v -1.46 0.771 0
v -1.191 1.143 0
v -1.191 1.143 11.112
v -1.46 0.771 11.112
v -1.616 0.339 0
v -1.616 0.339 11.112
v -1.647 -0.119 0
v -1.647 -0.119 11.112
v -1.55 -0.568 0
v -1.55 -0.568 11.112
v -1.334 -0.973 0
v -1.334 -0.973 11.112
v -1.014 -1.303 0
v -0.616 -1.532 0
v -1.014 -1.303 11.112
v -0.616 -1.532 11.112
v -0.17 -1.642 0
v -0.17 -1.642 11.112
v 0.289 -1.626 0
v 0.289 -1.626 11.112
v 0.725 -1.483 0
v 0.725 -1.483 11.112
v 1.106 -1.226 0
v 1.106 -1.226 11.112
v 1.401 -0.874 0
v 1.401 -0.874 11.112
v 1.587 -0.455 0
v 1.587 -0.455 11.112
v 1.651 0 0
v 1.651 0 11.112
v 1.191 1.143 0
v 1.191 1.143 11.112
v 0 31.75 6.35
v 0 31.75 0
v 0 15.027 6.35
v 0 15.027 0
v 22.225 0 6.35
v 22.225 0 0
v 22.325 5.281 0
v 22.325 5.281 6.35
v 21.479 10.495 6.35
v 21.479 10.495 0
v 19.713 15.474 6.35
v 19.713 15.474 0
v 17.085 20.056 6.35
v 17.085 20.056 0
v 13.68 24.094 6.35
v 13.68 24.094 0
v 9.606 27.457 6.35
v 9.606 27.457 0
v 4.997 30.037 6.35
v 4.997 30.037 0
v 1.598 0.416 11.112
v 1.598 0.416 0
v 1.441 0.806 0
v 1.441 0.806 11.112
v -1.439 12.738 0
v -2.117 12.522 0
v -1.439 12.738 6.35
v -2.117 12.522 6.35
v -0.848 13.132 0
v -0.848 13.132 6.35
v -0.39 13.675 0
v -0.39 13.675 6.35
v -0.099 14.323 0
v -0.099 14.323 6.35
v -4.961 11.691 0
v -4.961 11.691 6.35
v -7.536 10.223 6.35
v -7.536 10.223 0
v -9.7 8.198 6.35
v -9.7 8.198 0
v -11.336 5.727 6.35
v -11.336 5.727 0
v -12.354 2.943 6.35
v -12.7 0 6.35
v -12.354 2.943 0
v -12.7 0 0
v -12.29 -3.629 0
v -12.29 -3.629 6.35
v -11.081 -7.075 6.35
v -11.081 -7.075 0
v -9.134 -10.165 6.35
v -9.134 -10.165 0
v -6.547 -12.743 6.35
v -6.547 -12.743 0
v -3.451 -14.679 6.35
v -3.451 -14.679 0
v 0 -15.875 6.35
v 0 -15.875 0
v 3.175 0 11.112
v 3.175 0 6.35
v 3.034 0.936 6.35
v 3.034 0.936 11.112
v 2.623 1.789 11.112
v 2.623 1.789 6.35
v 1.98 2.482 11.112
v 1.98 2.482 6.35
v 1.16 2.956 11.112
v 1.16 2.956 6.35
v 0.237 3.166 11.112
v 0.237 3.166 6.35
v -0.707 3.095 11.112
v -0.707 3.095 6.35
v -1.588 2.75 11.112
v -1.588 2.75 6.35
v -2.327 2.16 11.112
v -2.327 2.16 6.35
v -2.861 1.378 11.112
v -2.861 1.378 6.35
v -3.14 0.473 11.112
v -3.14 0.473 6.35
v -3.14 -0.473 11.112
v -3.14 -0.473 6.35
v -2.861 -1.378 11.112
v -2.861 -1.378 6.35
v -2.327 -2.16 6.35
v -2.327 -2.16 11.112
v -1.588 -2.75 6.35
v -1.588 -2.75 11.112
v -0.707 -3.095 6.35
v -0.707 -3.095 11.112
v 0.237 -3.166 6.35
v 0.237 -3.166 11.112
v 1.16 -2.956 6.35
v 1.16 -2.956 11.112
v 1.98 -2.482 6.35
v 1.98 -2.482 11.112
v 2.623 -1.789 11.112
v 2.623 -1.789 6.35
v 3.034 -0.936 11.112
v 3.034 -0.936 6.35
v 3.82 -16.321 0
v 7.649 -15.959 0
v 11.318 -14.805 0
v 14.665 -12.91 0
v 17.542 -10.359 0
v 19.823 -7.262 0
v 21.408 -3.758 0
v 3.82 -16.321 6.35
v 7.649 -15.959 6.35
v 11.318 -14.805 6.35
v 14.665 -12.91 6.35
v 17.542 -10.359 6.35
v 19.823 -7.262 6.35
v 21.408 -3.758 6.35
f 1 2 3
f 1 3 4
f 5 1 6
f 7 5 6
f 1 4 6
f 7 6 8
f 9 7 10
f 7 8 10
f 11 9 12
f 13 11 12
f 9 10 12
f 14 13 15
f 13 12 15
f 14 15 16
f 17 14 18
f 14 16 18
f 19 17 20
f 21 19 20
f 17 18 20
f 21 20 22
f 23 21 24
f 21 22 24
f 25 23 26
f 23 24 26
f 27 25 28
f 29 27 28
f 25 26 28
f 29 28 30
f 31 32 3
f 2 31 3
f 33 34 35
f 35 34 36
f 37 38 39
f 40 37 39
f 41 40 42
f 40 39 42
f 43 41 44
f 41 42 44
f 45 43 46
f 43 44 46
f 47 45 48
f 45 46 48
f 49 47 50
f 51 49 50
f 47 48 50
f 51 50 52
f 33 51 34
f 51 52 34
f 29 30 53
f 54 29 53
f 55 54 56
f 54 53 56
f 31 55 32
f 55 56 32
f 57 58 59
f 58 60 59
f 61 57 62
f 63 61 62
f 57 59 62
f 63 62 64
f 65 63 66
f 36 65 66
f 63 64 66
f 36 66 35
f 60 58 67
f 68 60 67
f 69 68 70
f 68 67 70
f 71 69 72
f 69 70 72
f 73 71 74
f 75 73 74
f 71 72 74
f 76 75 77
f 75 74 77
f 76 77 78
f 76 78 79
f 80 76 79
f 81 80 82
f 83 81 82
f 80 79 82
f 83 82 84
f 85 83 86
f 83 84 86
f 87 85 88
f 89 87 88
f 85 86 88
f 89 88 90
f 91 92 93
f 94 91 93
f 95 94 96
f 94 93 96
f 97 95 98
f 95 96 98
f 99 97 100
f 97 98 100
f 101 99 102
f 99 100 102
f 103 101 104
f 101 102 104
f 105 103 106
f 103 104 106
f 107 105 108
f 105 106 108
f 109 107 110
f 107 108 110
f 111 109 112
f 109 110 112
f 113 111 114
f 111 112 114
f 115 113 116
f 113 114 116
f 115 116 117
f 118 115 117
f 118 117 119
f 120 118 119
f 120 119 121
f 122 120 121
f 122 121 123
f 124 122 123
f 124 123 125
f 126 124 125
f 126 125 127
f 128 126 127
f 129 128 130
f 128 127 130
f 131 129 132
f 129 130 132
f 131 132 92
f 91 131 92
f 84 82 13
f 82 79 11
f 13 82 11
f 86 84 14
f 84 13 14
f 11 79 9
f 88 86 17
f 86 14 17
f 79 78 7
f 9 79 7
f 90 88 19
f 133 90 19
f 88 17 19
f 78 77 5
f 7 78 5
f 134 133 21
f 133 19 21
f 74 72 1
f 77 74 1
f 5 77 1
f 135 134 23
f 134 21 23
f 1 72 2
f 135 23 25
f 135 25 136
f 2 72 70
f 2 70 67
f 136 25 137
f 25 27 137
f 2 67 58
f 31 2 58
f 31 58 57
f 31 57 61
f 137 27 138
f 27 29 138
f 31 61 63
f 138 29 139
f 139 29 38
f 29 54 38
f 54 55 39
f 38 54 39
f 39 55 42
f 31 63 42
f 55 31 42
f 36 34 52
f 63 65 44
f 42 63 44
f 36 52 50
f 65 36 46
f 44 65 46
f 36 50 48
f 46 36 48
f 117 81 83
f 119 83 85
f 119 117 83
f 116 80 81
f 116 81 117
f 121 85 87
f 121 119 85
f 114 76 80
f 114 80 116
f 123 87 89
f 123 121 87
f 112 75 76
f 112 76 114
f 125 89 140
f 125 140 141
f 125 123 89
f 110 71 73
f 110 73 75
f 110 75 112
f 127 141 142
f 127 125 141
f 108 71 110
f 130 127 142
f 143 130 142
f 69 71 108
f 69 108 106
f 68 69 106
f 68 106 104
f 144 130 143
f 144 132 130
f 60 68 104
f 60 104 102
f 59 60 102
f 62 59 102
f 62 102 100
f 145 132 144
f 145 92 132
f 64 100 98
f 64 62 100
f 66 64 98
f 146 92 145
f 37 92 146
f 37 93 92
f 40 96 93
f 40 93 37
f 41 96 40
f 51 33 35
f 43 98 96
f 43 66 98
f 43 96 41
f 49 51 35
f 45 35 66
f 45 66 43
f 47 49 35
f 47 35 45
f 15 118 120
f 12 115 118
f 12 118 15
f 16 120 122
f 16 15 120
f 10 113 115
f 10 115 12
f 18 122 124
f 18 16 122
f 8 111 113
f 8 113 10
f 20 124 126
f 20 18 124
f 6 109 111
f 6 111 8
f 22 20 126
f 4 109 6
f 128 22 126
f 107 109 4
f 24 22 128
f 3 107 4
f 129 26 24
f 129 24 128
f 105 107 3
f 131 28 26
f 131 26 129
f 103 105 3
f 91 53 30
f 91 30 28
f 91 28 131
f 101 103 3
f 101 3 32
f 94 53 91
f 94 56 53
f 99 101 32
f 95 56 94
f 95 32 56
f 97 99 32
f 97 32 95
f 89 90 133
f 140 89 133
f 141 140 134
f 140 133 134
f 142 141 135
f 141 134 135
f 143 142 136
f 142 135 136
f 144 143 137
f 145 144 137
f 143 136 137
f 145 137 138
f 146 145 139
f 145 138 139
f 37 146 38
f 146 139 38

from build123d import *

# Parameters (mm, degrees)
BOSS_EXTRUDE1_DEPTH = 6.35
SKETCH2_R           = 3.175
BOSS_EXTRUDE2_DEPTH = 4.7625
CUT_EXTRUDE1_DEPTH  = 12.1125
FILLET1_R           = 2.54


with BuildPart() as part:
    # Sketch1 → Boss-Extrude1 (new body)
    with BuildSketch(Plane.XY):
        with BuildLine():
            ThreePointArc((0, -15.875), (14.664616841, -12.910463577), (22.225, 0))
            ThreePointArc((22.225, 0), (17.085257234, 20.055930064), (0, 31.75))
            Line((0, 31.75), (0, 0))
            Line((0, 0), (-12.7, 0))
            ThreePointArc((-12.7, 0), (-9.134324659, -10.164959727), (0, -15.875))
        make_face()
        with BuildLine():
            Line((-12.7, 0), (0, 0))
            Line((0, 0), (0, 12.7))
            ThreePointArc((0, 12.7), (-8.980256121, 8.980256121), (-12.7, 0))
        make_face()
    extrude(amount=BOSS_EXTRUDE1_DEPTH)

    # Sketch2 → Boss-Extrude2 (add)
    with BuildSketch(Plane.XY.offset(6.35)):
        Circle(SKETCH2_R)
    extrude(amount=BOSS_EXTRUDE2_DEPTH)

    # Sketch3 → Cut-Extrude1 (cut, through all)
    with BuildSketch(Plane.XY.offset(11.1125)):
        with BuildLine():
            Line((1.191365603, 1.143), (-1.191365603, 1.143))
            ThreePointArc((-1.191365603, 1.143), (-0.61597743, -1.531787454), (1.651, 0))
            ThreePointArc((1.651, 0), (1.531787454, 0.61597743), (1.191365603, 1.143))
        make_face()
    extrude(amount=-CUT_EXTRUDE1_DEPTH, mode=Mode.SUBTRACT)

    # Fillet1
    fillet1_edges = [part.edges().sort_by_distance(p)[0] for p in [
        (0, 12.7, 3.175),
    ]]
    fillet(fillet1_edges, radius=FILLET1_R)


solid = part.part
